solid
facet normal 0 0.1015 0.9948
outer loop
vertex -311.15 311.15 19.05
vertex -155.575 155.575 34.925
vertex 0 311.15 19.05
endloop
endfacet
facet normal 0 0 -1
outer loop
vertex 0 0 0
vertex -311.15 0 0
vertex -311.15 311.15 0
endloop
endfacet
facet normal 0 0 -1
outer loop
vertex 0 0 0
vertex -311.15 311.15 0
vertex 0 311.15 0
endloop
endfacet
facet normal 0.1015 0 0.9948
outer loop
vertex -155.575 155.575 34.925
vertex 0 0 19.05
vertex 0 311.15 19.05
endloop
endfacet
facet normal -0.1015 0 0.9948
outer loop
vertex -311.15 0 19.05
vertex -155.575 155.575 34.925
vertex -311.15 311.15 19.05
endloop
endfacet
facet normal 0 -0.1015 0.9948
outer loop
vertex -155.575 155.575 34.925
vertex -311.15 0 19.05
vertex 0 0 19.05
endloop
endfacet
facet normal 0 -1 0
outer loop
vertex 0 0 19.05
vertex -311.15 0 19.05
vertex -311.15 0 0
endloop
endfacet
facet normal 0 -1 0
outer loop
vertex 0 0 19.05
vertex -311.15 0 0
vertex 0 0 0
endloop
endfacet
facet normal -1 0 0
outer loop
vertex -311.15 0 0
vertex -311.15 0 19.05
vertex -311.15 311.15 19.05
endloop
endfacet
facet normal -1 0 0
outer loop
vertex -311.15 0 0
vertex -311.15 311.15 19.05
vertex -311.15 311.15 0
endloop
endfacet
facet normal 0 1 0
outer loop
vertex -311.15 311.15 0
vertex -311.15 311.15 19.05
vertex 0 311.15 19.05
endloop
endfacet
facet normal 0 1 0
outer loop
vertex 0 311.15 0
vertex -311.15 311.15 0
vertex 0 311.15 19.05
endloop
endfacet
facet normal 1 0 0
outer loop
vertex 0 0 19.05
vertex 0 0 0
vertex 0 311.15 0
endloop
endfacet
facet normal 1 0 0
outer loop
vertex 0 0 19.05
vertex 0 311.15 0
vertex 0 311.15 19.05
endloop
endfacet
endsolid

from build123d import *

# Parameters (mm, degrees)
F1_DEPTH = 311.15
F2_W     = 311.15
F2_H     = 19.05
F3_DEPTH = 311.151


with BuildPart() as f1:
    # F0 (on Front) → F1 (new body)
    with BuildSketch(Plane.XZ):
        Polygon((-311.15, 0), (0, 0), (0, 19.05), (-155.575, 34.925), (-311.15, 19.05), align=None)
    extrude(amount=-F1_DEPTH)

    # F2 (on face) → F3 (intersect, through all)
    with BuildSketch(Plane(origin=(-311.15, 0, 0), x_dir=(0, -1, 0), z_dir=(-1, 0, 0))):
        Polygon((-311.15, 19.05), (0, 19.05), (-155.575, 34.925), align=None)
        with Locations((-155.575, 9.525)):
            Rectangle(F2_W, F2_H)
    extrude(amount=-F3_DEPTH, mode=Mode.INTERSECT)


solid = f1.part
